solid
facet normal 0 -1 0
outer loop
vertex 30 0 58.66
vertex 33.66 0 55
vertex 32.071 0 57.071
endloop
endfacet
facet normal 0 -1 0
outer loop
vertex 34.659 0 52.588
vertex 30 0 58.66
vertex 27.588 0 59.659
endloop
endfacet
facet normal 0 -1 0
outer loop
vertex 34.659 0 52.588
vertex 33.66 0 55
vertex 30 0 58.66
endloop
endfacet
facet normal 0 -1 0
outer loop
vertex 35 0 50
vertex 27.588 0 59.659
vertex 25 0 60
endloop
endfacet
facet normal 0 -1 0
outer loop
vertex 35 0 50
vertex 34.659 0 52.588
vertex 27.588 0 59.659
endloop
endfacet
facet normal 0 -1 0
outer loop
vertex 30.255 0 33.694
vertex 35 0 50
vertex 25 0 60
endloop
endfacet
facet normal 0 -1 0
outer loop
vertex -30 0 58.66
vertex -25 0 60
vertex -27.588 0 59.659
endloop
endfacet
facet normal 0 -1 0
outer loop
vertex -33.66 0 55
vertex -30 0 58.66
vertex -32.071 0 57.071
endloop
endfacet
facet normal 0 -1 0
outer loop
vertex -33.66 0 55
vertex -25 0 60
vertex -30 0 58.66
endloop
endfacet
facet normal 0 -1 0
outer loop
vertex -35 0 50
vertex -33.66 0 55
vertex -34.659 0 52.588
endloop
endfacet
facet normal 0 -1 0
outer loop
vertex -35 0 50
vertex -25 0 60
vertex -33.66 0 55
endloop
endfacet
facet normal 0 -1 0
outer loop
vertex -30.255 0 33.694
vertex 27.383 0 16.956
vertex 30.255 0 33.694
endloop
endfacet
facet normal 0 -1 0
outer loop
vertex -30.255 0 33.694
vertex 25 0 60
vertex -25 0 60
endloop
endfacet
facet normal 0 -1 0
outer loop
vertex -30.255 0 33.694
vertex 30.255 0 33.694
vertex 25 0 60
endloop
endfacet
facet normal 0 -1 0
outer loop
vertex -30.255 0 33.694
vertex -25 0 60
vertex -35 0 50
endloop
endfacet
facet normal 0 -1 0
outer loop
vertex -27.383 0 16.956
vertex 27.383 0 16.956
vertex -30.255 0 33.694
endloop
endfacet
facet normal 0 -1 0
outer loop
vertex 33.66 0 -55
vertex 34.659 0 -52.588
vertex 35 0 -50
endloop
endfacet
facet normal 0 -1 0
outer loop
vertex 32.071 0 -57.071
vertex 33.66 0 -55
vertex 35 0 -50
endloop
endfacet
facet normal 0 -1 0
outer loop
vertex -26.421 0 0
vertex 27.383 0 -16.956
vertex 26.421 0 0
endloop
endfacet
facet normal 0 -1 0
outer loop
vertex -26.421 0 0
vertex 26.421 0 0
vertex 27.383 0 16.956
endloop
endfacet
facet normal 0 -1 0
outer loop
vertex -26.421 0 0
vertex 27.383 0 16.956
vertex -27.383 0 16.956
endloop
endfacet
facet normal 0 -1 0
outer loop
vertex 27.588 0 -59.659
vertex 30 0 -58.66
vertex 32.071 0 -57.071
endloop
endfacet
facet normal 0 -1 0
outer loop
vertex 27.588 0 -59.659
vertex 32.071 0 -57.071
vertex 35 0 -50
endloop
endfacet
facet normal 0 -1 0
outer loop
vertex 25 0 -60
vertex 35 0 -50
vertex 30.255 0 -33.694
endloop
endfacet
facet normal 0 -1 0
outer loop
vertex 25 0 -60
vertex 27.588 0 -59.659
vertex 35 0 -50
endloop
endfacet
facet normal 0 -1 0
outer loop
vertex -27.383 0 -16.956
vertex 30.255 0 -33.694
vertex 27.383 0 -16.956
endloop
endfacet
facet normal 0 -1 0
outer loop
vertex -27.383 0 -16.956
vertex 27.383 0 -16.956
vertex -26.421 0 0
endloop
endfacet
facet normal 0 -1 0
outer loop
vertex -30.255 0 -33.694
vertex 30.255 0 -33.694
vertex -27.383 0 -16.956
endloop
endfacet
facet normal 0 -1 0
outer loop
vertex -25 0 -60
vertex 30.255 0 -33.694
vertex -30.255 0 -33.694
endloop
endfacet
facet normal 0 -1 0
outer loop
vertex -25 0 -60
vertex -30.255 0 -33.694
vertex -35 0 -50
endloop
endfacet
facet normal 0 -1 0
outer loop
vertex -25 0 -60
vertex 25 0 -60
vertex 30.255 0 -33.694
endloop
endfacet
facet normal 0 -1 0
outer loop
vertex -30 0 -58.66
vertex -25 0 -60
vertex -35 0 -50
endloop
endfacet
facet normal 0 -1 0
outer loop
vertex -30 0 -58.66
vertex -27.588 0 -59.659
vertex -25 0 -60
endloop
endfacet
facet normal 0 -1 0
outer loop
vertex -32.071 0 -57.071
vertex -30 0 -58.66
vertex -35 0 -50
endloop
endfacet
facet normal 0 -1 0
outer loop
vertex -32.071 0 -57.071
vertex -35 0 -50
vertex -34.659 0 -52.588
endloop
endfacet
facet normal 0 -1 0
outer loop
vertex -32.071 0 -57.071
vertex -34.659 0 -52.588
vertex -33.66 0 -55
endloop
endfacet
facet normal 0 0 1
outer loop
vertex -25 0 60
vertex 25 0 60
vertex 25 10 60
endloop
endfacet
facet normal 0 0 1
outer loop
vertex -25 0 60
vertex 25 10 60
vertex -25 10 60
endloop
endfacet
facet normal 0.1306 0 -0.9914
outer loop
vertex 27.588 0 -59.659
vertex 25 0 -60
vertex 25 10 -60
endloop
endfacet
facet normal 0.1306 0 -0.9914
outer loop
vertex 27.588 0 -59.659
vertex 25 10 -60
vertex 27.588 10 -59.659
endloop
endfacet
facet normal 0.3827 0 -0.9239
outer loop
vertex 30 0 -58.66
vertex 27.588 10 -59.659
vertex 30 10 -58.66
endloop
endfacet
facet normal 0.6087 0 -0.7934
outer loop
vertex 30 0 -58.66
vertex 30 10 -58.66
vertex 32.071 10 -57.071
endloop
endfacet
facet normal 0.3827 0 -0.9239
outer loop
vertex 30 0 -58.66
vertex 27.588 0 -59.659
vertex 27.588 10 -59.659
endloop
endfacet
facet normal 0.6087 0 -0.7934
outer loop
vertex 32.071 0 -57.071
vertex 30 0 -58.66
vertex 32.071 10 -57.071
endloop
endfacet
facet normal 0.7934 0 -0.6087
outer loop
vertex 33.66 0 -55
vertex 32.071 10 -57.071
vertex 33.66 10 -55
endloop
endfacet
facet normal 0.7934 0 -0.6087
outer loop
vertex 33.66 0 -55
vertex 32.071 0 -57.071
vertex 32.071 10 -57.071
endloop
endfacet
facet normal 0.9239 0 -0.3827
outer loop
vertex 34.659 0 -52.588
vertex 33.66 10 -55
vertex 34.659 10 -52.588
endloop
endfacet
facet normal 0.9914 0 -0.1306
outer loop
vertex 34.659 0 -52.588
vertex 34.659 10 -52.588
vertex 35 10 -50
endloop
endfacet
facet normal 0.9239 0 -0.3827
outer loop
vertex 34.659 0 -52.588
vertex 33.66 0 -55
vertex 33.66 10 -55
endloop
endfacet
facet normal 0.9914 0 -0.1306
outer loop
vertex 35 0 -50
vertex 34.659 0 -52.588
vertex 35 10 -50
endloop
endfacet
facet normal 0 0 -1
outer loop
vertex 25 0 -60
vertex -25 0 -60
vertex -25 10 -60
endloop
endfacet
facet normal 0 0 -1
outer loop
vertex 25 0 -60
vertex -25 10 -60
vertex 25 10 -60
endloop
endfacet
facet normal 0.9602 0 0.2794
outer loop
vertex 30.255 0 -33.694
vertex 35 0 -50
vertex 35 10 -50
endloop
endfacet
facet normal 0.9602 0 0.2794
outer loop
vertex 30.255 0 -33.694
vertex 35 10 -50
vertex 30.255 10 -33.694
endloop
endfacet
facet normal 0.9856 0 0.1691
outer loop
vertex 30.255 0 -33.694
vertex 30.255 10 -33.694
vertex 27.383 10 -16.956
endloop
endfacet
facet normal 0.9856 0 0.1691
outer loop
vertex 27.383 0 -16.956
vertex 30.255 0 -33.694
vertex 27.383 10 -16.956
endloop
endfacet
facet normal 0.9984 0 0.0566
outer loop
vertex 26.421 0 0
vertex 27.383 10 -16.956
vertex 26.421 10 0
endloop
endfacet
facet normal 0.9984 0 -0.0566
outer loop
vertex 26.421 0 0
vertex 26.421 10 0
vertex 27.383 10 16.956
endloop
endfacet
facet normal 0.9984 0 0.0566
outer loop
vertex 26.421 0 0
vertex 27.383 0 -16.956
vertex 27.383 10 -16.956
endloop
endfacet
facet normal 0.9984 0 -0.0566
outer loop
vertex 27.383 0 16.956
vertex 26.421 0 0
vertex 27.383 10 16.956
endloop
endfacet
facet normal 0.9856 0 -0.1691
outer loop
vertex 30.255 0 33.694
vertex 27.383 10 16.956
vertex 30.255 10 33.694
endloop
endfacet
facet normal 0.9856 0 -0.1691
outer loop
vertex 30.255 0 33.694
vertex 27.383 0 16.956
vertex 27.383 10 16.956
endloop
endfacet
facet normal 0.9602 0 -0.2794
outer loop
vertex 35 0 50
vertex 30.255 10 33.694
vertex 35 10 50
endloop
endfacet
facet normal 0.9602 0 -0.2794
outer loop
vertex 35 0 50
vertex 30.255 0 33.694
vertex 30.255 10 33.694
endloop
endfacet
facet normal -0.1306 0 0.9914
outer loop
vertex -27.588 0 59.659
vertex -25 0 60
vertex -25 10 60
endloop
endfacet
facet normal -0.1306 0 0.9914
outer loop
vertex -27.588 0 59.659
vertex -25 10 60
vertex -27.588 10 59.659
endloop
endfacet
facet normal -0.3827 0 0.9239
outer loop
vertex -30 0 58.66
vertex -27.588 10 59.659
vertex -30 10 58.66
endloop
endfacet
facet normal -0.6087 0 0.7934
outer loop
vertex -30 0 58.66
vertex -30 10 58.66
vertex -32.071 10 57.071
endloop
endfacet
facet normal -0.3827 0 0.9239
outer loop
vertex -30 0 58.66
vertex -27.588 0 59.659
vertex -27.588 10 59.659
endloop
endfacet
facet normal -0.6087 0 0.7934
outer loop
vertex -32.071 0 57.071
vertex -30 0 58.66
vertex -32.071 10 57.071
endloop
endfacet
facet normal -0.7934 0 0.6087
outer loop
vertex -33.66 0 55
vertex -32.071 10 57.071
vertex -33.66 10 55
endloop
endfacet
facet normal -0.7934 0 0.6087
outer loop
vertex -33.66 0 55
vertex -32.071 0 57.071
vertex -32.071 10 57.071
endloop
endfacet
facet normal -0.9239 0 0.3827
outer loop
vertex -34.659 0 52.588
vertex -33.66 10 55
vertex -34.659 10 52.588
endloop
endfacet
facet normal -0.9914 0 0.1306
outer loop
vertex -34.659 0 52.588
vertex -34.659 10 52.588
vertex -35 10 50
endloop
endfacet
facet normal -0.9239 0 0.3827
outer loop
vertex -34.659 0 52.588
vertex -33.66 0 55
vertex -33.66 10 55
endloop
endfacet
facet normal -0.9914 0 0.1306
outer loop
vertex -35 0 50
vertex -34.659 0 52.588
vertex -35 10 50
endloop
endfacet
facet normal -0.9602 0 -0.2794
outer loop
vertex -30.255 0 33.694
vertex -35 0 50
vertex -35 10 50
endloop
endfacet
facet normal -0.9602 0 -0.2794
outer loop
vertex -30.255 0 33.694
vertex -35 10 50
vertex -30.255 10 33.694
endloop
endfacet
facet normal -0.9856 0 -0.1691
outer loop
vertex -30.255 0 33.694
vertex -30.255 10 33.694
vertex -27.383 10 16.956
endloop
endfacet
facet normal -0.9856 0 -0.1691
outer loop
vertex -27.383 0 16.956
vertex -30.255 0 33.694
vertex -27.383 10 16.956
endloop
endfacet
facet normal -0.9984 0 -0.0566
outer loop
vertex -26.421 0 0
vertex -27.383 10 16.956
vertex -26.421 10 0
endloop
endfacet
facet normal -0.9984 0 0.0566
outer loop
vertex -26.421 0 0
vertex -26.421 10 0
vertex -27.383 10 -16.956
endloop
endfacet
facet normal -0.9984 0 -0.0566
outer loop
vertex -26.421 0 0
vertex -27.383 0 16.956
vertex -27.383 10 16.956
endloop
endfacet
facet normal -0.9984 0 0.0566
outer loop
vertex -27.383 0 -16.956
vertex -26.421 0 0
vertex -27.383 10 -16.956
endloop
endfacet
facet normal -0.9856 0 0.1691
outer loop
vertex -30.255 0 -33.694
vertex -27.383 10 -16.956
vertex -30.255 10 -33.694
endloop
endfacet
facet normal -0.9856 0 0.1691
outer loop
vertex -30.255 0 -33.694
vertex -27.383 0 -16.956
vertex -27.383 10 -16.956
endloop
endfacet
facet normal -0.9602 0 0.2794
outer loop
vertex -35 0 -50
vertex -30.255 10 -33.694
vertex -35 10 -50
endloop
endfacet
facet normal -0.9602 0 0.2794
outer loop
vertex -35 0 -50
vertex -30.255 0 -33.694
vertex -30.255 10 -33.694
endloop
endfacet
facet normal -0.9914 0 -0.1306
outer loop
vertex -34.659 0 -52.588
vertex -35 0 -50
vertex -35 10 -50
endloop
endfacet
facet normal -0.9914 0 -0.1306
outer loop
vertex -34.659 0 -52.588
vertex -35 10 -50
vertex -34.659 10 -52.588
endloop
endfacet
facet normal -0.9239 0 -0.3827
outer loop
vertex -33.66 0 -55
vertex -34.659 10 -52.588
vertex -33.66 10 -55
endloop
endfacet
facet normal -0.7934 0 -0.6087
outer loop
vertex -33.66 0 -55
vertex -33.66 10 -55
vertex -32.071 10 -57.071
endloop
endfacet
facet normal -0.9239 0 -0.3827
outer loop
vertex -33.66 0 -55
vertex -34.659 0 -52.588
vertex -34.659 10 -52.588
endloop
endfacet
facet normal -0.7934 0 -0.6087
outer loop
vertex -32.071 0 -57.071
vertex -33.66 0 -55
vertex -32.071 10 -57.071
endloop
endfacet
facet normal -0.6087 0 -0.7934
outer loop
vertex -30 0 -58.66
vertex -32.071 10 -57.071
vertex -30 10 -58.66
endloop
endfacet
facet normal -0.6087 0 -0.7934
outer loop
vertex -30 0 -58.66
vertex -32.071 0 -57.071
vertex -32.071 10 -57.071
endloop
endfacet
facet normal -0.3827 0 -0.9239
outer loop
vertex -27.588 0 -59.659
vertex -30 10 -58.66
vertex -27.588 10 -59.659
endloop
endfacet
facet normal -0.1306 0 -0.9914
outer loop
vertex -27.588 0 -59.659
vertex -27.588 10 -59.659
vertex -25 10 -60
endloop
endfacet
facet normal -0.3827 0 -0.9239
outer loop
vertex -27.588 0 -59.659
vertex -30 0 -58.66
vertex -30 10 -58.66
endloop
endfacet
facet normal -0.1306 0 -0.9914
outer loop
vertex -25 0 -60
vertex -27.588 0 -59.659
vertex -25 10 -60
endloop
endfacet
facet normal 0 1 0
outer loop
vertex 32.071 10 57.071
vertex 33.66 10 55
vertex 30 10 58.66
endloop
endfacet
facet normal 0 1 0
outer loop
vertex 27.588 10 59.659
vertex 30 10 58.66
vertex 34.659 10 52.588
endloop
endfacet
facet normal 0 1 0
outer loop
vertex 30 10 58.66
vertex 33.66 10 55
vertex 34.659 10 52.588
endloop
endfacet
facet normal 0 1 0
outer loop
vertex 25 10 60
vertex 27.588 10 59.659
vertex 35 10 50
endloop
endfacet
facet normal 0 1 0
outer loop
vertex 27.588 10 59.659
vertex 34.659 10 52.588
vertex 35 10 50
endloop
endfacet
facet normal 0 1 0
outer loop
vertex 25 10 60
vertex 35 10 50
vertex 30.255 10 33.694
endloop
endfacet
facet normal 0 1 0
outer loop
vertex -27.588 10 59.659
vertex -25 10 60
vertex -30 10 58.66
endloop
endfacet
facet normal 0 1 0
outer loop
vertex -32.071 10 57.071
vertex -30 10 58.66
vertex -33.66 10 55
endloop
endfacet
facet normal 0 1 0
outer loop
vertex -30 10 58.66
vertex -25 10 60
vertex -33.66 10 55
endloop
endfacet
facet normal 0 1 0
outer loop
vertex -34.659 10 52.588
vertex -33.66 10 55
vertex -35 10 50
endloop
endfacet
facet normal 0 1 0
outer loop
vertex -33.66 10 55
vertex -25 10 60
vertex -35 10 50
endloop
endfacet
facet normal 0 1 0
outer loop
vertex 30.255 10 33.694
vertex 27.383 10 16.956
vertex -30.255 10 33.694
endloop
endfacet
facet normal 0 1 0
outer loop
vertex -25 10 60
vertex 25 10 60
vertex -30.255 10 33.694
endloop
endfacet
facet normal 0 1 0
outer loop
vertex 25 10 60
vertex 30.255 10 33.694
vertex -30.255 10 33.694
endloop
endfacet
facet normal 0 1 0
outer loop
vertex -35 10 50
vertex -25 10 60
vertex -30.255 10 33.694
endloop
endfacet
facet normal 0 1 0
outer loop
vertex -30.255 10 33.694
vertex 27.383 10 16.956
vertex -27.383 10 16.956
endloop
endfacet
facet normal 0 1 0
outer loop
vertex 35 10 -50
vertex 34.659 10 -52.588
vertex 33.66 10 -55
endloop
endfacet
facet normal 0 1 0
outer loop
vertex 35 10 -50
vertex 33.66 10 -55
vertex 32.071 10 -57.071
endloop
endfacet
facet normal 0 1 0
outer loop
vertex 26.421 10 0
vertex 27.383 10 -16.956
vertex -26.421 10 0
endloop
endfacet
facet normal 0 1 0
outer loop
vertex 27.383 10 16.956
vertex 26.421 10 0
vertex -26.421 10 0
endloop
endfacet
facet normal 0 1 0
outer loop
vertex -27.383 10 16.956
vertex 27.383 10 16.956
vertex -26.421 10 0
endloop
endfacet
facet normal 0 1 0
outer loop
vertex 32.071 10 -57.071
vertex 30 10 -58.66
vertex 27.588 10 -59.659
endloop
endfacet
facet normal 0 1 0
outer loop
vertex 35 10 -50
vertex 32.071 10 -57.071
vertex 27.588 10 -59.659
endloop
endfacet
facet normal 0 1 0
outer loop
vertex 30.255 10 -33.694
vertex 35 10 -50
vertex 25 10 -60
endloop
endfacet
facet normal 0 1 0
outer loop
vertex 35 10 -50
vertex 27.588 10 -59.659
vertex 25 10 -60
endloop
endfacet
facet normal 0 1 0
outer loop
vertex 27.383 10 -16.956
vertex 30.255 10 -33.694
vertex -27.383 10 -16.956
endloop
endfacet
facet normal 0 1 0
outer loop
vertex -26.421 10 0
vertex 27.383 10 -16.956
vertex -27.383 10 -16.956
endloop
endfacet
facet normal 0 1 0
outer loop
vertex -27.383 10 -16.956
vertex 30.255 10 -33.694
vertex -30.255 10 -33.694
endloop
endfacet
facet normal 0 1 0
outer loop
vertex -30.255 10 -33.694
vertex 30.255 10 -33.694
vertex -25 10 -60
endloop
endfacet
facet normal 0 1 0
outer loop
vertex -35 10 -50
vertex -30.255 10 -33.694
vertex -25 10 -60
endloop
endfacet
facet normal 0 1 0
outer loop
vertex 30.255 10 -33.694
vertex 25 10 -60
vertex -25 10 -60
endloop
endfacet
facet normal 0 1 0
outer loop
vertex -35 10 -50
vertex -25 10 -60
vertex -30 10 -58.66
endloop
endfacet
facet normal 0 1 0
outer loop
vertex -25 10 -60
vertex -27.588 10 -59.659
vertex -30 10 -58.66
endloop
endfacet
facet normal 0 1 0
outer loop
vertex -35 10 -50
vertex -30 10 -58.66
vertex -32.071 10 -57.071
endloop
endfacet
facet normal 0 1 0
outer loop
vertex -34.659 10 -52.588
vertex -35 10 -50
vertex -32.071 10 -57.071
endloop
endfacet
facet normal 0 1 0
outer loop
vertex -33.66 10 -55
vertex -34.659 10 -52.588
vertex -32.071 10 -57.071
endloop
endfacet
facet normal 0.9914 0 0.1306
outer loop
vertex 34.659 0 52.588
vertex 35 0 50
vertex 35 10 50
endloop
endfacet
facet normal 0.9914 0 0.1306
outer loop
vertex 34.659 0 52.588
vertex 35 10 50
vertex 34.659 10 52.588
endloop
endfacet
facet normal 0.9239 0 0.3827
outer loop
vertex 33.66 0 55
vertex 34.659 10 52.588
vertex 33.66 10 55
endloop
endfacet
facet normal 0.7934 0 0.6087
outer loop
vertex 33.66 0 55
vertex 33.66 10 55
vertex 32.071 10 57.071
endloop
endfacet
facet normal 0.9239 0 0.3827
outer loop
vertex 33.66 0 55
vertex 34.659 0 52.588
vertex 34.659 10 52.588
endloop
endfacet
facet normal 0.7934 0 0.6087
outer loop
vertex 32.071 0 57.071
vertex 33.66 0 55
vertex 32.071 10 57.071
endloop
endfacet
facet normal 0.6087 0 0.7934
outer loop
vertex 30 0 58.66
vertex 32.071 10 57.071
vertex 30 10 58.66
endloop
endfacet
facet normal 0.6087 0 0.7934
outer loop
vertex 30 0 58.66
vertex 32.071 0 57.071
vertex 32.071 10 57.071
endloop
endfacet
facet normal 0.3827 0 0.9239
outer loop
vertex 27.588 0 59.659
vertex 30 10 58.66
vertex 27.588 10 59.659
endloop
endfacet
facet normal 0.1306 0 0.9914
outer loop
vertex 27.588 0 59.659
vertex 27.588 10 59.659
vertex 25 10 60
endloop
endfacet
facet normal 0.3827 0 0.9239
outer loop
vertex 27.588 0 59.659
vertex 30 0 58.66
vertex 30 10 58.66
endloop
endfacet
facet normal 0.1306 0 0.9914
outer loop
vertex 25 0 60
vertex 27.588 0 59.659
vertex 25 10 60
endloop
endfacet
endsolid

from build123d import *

# Parameters (mm, degrees)
BOSS_EXTRUDE1_DEPTH = 10


with BuildPart() as part:
    # Sketch2 → Boss-Extrude1 (new body)
    with BuildSketch(Plane(origin=(0, 0, 0), x_dir=(1, 0, 0), z_dir=(0, 1, 0))):
        with BuildLine():
            Line((-25, 60), (25, 60))
            ThreePointArc((25, 60), (32.071067812, 57.071067812), (35, 50))
            ThreePointArc((35, 50), (26.421356237, 0), (35, -50))
            ThreePointArc((35, -50), (32.071067812, -57.071067812), (25, -60))
            Line((25, -60), (-25, -60))
            ThreePointArc((-25, -60), (-32.071067812, -57.071067812), (-35, -50))
            ThreePointArc((-35, -50), (-26.421356237, 0), (-35, 50))
            ThreePointArc((-35, 50), (-32.071067812, 57.071067812), (-25, 60))
        make_face()
    extrude(amount=BOSS_EXTRUDE1_DEPTH)


solid = part.part
